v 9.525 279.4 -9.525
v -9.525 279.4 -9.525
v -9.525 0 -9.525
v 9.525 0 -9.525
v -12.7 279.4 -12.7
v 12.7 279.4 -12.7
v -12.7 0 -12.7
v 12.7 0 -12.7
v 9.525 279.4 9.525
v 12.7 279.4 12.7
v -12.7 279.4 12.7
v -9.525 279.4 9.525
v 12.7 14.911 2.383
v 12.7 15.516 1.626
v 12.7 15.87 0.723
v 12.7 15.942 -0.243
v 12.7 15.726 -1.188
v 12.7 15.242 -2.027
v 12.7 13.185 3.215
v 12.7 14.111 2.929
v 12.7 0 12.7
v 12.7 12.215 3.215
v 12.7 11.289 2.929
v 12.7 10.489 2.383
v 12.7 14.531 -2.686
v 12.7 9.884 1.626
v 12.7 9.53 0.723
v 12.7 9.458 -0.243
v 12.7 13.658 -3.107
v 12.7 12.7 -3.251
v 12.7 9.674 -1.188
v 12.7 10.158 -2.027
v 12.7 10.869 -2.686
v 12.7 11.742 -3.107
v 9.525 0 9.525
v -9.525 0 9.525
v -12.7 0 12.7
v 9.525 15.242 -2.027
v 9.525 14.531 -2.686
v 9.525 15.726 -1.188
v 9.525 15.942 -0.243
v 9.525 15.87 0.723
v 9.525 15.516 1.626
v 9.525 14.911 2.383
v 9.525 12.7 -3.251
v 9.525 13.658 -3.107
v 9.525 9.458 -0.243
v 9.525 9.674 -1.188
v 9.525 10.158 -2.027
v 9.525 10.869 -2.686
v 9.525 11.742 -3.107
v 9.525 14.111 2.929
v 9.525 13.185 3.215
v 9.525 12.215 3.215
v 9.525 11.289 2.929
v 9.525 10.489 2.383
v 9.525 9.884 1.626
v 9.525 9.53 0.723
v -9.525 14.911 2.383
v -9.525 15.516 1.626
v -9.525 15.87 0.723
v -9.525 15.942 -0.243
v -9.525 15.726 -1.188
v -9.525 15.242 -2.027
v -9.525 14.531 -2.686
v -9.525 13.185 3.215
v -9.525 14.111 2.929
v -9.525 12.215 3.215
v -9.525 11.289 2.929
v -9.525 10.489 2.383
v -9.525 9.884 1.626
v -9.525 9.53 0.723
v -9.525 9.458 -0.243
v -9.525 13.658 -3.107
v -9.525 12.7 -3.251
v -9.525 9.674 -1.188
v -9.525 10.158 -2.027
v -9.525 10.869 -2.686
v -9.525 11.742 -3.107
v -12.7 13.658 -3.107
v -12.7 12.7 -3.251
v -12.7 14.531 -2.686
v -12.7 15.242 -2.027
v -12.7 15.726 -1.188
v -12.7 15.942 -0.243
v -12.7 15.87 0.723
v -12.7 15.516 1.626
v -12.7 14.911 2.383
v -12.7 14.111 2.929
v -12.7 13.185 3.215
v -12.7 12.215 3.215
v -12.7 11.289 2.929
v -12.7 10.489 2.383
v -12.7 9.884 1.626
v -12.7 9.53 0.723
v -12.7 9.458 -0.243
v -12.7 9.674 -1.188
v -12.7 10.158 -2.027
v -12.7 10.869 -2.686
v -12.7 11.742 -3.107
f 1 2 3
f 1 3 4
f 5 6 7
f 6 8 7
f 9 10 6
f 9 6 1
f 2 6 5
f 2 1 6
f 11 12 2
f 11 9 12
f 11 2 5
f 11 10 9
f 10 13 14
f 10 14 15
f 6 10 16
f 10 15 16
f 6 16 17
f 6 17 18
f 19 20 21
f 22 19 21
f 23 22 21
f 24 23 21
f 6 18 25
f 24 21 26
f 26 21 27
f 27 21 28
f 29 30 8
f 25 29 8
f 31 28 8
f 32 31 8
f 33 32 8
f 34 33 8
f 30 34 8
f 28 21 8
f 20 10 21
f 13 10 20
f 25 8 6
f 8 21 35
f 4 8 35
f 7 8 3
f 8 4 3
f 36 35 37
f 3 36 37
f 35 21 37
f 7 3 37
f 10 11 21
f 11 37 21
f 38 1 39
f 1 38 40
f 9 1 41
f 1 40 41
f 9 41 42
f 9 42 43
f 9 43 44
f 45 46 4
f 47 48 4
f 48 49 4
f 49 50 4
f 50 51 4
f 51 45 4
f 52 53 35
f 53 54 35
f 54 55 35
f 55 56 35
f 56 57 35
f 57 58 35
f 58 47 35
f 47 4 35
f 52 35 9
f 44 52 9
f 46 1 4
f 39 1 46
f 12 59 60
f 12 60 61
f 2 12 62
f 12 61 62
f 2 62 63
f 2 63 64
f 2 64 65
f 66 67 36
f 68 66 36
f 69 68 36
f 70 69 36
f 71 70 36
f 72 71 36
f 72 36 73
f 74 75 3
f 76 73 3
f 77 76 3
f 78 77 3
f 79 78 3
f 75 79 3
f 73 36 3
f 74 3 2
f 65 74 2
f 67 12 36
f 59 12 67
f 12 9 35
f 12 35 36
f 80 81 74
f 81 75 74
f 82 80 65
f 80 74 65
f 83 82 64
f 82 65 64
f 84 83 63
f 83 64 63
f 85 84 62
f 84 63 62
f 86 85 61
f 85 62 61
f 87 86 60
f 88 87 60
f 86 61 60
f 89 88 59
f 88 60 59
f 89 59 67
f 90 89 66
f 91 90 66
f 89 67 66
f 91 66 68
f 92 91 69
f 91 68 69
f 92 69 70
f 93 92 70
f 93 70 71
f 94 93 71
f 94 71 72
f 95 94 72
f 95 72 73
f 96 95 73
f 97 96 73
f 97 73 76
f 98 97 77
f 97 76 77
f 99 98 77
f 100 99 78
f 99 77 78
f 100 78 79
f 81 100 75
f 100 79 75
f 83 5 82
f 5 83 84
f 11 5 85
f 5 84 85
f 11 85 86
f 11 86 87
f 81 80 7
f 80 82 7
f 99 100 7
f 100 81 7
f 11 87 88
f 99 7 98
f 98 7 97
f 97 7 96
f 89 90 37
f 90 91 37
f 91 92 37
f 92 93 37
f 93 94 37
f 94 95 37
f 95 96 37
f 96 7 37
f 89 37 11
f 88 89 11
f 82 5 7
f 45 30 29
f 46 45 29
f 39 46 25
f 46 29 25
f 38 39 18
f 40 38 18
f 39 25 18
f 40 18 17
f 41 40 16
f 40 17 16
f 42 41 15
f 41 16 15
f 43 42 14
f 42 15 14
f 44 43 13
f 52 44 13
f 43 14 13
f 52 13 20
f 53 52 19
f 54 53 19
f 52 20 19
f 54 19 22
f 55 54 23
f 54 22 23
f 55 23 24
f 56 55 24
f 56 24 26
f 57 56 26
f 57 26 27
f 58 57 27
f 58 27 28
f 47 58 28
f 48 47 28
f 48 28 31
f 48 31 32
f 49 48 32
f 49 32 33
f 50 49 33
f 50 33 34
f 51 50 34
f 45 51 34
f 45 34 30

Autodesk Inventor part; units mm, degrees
ref_plane "YZ Plane" through (0, 0, 0) normal (1, 0, 0) x (0, 1, 0)
ref_plane "XZ Plane" through (0, 0, 0) normal (0, 1, 0) x (-1, 0, 0)
ref_plane "XY Plane" through (0, 0, 0) normal (0, 0, 1) x (1, 0, 0)
sketch "Sketch1" plane through (0, 0, 0) normal (0, 1, 0) x (-1, 0, 0)
  line L0 (-12.7, -12.7) -> (12.7, -12.7)
  line L1 (12.7, -12.7) -> (12.7, 12.7)
  line L2 (12.7, 12.7) -> (-12.7, 12.7)
  line L3 (-12.7, 12.7) -> (-12.7, -12.7)
  line L4 (-12.7, -12.7) -> (12.7, 12.7) construction
  line L5 (12.7, -12.7) -> (-12.7, 12.7) construction
  line L6 (9.525, 9.525) -> (9.525, -9.525)
  line L7 (9.525, -9.525) -> (-9.525, -9.525)
  line L8 (-9.525, -9.525) -> (-9.525, 9.525)
  line L9 (-9.525, 9.525) -> (9.525, 9.525)
  point P0 (0, 0)
  dimension "d0" = 25.4
  dimension "d1" = 25.4
  dimension "d2" = 3.175
extrude "Extrusion1" add sketch "Sketch1" along normal blind 279.4
sketch "Sketch2" plane through (12.7, 0, 12.7) normal (1, 0, 0) x (0, 0, -1)
  circle A0 centre (12.7, 12.7) radius 3.2512
  line L0 (0, 0) -> (25.4, 0) projected
  point P0 (12.7, 0)
  point P1 (12.7, 0)
  point P2 (12.7, 0)
  dimension "d5" = 6.5024
  dimension "d6" = 12.7
extrude "Extrusion2" cut sketch "Sketch2" against normal blind 25.4
properties part number "STRU_010_BilletPole_11in_Unique" material "Aluminum 6061"
